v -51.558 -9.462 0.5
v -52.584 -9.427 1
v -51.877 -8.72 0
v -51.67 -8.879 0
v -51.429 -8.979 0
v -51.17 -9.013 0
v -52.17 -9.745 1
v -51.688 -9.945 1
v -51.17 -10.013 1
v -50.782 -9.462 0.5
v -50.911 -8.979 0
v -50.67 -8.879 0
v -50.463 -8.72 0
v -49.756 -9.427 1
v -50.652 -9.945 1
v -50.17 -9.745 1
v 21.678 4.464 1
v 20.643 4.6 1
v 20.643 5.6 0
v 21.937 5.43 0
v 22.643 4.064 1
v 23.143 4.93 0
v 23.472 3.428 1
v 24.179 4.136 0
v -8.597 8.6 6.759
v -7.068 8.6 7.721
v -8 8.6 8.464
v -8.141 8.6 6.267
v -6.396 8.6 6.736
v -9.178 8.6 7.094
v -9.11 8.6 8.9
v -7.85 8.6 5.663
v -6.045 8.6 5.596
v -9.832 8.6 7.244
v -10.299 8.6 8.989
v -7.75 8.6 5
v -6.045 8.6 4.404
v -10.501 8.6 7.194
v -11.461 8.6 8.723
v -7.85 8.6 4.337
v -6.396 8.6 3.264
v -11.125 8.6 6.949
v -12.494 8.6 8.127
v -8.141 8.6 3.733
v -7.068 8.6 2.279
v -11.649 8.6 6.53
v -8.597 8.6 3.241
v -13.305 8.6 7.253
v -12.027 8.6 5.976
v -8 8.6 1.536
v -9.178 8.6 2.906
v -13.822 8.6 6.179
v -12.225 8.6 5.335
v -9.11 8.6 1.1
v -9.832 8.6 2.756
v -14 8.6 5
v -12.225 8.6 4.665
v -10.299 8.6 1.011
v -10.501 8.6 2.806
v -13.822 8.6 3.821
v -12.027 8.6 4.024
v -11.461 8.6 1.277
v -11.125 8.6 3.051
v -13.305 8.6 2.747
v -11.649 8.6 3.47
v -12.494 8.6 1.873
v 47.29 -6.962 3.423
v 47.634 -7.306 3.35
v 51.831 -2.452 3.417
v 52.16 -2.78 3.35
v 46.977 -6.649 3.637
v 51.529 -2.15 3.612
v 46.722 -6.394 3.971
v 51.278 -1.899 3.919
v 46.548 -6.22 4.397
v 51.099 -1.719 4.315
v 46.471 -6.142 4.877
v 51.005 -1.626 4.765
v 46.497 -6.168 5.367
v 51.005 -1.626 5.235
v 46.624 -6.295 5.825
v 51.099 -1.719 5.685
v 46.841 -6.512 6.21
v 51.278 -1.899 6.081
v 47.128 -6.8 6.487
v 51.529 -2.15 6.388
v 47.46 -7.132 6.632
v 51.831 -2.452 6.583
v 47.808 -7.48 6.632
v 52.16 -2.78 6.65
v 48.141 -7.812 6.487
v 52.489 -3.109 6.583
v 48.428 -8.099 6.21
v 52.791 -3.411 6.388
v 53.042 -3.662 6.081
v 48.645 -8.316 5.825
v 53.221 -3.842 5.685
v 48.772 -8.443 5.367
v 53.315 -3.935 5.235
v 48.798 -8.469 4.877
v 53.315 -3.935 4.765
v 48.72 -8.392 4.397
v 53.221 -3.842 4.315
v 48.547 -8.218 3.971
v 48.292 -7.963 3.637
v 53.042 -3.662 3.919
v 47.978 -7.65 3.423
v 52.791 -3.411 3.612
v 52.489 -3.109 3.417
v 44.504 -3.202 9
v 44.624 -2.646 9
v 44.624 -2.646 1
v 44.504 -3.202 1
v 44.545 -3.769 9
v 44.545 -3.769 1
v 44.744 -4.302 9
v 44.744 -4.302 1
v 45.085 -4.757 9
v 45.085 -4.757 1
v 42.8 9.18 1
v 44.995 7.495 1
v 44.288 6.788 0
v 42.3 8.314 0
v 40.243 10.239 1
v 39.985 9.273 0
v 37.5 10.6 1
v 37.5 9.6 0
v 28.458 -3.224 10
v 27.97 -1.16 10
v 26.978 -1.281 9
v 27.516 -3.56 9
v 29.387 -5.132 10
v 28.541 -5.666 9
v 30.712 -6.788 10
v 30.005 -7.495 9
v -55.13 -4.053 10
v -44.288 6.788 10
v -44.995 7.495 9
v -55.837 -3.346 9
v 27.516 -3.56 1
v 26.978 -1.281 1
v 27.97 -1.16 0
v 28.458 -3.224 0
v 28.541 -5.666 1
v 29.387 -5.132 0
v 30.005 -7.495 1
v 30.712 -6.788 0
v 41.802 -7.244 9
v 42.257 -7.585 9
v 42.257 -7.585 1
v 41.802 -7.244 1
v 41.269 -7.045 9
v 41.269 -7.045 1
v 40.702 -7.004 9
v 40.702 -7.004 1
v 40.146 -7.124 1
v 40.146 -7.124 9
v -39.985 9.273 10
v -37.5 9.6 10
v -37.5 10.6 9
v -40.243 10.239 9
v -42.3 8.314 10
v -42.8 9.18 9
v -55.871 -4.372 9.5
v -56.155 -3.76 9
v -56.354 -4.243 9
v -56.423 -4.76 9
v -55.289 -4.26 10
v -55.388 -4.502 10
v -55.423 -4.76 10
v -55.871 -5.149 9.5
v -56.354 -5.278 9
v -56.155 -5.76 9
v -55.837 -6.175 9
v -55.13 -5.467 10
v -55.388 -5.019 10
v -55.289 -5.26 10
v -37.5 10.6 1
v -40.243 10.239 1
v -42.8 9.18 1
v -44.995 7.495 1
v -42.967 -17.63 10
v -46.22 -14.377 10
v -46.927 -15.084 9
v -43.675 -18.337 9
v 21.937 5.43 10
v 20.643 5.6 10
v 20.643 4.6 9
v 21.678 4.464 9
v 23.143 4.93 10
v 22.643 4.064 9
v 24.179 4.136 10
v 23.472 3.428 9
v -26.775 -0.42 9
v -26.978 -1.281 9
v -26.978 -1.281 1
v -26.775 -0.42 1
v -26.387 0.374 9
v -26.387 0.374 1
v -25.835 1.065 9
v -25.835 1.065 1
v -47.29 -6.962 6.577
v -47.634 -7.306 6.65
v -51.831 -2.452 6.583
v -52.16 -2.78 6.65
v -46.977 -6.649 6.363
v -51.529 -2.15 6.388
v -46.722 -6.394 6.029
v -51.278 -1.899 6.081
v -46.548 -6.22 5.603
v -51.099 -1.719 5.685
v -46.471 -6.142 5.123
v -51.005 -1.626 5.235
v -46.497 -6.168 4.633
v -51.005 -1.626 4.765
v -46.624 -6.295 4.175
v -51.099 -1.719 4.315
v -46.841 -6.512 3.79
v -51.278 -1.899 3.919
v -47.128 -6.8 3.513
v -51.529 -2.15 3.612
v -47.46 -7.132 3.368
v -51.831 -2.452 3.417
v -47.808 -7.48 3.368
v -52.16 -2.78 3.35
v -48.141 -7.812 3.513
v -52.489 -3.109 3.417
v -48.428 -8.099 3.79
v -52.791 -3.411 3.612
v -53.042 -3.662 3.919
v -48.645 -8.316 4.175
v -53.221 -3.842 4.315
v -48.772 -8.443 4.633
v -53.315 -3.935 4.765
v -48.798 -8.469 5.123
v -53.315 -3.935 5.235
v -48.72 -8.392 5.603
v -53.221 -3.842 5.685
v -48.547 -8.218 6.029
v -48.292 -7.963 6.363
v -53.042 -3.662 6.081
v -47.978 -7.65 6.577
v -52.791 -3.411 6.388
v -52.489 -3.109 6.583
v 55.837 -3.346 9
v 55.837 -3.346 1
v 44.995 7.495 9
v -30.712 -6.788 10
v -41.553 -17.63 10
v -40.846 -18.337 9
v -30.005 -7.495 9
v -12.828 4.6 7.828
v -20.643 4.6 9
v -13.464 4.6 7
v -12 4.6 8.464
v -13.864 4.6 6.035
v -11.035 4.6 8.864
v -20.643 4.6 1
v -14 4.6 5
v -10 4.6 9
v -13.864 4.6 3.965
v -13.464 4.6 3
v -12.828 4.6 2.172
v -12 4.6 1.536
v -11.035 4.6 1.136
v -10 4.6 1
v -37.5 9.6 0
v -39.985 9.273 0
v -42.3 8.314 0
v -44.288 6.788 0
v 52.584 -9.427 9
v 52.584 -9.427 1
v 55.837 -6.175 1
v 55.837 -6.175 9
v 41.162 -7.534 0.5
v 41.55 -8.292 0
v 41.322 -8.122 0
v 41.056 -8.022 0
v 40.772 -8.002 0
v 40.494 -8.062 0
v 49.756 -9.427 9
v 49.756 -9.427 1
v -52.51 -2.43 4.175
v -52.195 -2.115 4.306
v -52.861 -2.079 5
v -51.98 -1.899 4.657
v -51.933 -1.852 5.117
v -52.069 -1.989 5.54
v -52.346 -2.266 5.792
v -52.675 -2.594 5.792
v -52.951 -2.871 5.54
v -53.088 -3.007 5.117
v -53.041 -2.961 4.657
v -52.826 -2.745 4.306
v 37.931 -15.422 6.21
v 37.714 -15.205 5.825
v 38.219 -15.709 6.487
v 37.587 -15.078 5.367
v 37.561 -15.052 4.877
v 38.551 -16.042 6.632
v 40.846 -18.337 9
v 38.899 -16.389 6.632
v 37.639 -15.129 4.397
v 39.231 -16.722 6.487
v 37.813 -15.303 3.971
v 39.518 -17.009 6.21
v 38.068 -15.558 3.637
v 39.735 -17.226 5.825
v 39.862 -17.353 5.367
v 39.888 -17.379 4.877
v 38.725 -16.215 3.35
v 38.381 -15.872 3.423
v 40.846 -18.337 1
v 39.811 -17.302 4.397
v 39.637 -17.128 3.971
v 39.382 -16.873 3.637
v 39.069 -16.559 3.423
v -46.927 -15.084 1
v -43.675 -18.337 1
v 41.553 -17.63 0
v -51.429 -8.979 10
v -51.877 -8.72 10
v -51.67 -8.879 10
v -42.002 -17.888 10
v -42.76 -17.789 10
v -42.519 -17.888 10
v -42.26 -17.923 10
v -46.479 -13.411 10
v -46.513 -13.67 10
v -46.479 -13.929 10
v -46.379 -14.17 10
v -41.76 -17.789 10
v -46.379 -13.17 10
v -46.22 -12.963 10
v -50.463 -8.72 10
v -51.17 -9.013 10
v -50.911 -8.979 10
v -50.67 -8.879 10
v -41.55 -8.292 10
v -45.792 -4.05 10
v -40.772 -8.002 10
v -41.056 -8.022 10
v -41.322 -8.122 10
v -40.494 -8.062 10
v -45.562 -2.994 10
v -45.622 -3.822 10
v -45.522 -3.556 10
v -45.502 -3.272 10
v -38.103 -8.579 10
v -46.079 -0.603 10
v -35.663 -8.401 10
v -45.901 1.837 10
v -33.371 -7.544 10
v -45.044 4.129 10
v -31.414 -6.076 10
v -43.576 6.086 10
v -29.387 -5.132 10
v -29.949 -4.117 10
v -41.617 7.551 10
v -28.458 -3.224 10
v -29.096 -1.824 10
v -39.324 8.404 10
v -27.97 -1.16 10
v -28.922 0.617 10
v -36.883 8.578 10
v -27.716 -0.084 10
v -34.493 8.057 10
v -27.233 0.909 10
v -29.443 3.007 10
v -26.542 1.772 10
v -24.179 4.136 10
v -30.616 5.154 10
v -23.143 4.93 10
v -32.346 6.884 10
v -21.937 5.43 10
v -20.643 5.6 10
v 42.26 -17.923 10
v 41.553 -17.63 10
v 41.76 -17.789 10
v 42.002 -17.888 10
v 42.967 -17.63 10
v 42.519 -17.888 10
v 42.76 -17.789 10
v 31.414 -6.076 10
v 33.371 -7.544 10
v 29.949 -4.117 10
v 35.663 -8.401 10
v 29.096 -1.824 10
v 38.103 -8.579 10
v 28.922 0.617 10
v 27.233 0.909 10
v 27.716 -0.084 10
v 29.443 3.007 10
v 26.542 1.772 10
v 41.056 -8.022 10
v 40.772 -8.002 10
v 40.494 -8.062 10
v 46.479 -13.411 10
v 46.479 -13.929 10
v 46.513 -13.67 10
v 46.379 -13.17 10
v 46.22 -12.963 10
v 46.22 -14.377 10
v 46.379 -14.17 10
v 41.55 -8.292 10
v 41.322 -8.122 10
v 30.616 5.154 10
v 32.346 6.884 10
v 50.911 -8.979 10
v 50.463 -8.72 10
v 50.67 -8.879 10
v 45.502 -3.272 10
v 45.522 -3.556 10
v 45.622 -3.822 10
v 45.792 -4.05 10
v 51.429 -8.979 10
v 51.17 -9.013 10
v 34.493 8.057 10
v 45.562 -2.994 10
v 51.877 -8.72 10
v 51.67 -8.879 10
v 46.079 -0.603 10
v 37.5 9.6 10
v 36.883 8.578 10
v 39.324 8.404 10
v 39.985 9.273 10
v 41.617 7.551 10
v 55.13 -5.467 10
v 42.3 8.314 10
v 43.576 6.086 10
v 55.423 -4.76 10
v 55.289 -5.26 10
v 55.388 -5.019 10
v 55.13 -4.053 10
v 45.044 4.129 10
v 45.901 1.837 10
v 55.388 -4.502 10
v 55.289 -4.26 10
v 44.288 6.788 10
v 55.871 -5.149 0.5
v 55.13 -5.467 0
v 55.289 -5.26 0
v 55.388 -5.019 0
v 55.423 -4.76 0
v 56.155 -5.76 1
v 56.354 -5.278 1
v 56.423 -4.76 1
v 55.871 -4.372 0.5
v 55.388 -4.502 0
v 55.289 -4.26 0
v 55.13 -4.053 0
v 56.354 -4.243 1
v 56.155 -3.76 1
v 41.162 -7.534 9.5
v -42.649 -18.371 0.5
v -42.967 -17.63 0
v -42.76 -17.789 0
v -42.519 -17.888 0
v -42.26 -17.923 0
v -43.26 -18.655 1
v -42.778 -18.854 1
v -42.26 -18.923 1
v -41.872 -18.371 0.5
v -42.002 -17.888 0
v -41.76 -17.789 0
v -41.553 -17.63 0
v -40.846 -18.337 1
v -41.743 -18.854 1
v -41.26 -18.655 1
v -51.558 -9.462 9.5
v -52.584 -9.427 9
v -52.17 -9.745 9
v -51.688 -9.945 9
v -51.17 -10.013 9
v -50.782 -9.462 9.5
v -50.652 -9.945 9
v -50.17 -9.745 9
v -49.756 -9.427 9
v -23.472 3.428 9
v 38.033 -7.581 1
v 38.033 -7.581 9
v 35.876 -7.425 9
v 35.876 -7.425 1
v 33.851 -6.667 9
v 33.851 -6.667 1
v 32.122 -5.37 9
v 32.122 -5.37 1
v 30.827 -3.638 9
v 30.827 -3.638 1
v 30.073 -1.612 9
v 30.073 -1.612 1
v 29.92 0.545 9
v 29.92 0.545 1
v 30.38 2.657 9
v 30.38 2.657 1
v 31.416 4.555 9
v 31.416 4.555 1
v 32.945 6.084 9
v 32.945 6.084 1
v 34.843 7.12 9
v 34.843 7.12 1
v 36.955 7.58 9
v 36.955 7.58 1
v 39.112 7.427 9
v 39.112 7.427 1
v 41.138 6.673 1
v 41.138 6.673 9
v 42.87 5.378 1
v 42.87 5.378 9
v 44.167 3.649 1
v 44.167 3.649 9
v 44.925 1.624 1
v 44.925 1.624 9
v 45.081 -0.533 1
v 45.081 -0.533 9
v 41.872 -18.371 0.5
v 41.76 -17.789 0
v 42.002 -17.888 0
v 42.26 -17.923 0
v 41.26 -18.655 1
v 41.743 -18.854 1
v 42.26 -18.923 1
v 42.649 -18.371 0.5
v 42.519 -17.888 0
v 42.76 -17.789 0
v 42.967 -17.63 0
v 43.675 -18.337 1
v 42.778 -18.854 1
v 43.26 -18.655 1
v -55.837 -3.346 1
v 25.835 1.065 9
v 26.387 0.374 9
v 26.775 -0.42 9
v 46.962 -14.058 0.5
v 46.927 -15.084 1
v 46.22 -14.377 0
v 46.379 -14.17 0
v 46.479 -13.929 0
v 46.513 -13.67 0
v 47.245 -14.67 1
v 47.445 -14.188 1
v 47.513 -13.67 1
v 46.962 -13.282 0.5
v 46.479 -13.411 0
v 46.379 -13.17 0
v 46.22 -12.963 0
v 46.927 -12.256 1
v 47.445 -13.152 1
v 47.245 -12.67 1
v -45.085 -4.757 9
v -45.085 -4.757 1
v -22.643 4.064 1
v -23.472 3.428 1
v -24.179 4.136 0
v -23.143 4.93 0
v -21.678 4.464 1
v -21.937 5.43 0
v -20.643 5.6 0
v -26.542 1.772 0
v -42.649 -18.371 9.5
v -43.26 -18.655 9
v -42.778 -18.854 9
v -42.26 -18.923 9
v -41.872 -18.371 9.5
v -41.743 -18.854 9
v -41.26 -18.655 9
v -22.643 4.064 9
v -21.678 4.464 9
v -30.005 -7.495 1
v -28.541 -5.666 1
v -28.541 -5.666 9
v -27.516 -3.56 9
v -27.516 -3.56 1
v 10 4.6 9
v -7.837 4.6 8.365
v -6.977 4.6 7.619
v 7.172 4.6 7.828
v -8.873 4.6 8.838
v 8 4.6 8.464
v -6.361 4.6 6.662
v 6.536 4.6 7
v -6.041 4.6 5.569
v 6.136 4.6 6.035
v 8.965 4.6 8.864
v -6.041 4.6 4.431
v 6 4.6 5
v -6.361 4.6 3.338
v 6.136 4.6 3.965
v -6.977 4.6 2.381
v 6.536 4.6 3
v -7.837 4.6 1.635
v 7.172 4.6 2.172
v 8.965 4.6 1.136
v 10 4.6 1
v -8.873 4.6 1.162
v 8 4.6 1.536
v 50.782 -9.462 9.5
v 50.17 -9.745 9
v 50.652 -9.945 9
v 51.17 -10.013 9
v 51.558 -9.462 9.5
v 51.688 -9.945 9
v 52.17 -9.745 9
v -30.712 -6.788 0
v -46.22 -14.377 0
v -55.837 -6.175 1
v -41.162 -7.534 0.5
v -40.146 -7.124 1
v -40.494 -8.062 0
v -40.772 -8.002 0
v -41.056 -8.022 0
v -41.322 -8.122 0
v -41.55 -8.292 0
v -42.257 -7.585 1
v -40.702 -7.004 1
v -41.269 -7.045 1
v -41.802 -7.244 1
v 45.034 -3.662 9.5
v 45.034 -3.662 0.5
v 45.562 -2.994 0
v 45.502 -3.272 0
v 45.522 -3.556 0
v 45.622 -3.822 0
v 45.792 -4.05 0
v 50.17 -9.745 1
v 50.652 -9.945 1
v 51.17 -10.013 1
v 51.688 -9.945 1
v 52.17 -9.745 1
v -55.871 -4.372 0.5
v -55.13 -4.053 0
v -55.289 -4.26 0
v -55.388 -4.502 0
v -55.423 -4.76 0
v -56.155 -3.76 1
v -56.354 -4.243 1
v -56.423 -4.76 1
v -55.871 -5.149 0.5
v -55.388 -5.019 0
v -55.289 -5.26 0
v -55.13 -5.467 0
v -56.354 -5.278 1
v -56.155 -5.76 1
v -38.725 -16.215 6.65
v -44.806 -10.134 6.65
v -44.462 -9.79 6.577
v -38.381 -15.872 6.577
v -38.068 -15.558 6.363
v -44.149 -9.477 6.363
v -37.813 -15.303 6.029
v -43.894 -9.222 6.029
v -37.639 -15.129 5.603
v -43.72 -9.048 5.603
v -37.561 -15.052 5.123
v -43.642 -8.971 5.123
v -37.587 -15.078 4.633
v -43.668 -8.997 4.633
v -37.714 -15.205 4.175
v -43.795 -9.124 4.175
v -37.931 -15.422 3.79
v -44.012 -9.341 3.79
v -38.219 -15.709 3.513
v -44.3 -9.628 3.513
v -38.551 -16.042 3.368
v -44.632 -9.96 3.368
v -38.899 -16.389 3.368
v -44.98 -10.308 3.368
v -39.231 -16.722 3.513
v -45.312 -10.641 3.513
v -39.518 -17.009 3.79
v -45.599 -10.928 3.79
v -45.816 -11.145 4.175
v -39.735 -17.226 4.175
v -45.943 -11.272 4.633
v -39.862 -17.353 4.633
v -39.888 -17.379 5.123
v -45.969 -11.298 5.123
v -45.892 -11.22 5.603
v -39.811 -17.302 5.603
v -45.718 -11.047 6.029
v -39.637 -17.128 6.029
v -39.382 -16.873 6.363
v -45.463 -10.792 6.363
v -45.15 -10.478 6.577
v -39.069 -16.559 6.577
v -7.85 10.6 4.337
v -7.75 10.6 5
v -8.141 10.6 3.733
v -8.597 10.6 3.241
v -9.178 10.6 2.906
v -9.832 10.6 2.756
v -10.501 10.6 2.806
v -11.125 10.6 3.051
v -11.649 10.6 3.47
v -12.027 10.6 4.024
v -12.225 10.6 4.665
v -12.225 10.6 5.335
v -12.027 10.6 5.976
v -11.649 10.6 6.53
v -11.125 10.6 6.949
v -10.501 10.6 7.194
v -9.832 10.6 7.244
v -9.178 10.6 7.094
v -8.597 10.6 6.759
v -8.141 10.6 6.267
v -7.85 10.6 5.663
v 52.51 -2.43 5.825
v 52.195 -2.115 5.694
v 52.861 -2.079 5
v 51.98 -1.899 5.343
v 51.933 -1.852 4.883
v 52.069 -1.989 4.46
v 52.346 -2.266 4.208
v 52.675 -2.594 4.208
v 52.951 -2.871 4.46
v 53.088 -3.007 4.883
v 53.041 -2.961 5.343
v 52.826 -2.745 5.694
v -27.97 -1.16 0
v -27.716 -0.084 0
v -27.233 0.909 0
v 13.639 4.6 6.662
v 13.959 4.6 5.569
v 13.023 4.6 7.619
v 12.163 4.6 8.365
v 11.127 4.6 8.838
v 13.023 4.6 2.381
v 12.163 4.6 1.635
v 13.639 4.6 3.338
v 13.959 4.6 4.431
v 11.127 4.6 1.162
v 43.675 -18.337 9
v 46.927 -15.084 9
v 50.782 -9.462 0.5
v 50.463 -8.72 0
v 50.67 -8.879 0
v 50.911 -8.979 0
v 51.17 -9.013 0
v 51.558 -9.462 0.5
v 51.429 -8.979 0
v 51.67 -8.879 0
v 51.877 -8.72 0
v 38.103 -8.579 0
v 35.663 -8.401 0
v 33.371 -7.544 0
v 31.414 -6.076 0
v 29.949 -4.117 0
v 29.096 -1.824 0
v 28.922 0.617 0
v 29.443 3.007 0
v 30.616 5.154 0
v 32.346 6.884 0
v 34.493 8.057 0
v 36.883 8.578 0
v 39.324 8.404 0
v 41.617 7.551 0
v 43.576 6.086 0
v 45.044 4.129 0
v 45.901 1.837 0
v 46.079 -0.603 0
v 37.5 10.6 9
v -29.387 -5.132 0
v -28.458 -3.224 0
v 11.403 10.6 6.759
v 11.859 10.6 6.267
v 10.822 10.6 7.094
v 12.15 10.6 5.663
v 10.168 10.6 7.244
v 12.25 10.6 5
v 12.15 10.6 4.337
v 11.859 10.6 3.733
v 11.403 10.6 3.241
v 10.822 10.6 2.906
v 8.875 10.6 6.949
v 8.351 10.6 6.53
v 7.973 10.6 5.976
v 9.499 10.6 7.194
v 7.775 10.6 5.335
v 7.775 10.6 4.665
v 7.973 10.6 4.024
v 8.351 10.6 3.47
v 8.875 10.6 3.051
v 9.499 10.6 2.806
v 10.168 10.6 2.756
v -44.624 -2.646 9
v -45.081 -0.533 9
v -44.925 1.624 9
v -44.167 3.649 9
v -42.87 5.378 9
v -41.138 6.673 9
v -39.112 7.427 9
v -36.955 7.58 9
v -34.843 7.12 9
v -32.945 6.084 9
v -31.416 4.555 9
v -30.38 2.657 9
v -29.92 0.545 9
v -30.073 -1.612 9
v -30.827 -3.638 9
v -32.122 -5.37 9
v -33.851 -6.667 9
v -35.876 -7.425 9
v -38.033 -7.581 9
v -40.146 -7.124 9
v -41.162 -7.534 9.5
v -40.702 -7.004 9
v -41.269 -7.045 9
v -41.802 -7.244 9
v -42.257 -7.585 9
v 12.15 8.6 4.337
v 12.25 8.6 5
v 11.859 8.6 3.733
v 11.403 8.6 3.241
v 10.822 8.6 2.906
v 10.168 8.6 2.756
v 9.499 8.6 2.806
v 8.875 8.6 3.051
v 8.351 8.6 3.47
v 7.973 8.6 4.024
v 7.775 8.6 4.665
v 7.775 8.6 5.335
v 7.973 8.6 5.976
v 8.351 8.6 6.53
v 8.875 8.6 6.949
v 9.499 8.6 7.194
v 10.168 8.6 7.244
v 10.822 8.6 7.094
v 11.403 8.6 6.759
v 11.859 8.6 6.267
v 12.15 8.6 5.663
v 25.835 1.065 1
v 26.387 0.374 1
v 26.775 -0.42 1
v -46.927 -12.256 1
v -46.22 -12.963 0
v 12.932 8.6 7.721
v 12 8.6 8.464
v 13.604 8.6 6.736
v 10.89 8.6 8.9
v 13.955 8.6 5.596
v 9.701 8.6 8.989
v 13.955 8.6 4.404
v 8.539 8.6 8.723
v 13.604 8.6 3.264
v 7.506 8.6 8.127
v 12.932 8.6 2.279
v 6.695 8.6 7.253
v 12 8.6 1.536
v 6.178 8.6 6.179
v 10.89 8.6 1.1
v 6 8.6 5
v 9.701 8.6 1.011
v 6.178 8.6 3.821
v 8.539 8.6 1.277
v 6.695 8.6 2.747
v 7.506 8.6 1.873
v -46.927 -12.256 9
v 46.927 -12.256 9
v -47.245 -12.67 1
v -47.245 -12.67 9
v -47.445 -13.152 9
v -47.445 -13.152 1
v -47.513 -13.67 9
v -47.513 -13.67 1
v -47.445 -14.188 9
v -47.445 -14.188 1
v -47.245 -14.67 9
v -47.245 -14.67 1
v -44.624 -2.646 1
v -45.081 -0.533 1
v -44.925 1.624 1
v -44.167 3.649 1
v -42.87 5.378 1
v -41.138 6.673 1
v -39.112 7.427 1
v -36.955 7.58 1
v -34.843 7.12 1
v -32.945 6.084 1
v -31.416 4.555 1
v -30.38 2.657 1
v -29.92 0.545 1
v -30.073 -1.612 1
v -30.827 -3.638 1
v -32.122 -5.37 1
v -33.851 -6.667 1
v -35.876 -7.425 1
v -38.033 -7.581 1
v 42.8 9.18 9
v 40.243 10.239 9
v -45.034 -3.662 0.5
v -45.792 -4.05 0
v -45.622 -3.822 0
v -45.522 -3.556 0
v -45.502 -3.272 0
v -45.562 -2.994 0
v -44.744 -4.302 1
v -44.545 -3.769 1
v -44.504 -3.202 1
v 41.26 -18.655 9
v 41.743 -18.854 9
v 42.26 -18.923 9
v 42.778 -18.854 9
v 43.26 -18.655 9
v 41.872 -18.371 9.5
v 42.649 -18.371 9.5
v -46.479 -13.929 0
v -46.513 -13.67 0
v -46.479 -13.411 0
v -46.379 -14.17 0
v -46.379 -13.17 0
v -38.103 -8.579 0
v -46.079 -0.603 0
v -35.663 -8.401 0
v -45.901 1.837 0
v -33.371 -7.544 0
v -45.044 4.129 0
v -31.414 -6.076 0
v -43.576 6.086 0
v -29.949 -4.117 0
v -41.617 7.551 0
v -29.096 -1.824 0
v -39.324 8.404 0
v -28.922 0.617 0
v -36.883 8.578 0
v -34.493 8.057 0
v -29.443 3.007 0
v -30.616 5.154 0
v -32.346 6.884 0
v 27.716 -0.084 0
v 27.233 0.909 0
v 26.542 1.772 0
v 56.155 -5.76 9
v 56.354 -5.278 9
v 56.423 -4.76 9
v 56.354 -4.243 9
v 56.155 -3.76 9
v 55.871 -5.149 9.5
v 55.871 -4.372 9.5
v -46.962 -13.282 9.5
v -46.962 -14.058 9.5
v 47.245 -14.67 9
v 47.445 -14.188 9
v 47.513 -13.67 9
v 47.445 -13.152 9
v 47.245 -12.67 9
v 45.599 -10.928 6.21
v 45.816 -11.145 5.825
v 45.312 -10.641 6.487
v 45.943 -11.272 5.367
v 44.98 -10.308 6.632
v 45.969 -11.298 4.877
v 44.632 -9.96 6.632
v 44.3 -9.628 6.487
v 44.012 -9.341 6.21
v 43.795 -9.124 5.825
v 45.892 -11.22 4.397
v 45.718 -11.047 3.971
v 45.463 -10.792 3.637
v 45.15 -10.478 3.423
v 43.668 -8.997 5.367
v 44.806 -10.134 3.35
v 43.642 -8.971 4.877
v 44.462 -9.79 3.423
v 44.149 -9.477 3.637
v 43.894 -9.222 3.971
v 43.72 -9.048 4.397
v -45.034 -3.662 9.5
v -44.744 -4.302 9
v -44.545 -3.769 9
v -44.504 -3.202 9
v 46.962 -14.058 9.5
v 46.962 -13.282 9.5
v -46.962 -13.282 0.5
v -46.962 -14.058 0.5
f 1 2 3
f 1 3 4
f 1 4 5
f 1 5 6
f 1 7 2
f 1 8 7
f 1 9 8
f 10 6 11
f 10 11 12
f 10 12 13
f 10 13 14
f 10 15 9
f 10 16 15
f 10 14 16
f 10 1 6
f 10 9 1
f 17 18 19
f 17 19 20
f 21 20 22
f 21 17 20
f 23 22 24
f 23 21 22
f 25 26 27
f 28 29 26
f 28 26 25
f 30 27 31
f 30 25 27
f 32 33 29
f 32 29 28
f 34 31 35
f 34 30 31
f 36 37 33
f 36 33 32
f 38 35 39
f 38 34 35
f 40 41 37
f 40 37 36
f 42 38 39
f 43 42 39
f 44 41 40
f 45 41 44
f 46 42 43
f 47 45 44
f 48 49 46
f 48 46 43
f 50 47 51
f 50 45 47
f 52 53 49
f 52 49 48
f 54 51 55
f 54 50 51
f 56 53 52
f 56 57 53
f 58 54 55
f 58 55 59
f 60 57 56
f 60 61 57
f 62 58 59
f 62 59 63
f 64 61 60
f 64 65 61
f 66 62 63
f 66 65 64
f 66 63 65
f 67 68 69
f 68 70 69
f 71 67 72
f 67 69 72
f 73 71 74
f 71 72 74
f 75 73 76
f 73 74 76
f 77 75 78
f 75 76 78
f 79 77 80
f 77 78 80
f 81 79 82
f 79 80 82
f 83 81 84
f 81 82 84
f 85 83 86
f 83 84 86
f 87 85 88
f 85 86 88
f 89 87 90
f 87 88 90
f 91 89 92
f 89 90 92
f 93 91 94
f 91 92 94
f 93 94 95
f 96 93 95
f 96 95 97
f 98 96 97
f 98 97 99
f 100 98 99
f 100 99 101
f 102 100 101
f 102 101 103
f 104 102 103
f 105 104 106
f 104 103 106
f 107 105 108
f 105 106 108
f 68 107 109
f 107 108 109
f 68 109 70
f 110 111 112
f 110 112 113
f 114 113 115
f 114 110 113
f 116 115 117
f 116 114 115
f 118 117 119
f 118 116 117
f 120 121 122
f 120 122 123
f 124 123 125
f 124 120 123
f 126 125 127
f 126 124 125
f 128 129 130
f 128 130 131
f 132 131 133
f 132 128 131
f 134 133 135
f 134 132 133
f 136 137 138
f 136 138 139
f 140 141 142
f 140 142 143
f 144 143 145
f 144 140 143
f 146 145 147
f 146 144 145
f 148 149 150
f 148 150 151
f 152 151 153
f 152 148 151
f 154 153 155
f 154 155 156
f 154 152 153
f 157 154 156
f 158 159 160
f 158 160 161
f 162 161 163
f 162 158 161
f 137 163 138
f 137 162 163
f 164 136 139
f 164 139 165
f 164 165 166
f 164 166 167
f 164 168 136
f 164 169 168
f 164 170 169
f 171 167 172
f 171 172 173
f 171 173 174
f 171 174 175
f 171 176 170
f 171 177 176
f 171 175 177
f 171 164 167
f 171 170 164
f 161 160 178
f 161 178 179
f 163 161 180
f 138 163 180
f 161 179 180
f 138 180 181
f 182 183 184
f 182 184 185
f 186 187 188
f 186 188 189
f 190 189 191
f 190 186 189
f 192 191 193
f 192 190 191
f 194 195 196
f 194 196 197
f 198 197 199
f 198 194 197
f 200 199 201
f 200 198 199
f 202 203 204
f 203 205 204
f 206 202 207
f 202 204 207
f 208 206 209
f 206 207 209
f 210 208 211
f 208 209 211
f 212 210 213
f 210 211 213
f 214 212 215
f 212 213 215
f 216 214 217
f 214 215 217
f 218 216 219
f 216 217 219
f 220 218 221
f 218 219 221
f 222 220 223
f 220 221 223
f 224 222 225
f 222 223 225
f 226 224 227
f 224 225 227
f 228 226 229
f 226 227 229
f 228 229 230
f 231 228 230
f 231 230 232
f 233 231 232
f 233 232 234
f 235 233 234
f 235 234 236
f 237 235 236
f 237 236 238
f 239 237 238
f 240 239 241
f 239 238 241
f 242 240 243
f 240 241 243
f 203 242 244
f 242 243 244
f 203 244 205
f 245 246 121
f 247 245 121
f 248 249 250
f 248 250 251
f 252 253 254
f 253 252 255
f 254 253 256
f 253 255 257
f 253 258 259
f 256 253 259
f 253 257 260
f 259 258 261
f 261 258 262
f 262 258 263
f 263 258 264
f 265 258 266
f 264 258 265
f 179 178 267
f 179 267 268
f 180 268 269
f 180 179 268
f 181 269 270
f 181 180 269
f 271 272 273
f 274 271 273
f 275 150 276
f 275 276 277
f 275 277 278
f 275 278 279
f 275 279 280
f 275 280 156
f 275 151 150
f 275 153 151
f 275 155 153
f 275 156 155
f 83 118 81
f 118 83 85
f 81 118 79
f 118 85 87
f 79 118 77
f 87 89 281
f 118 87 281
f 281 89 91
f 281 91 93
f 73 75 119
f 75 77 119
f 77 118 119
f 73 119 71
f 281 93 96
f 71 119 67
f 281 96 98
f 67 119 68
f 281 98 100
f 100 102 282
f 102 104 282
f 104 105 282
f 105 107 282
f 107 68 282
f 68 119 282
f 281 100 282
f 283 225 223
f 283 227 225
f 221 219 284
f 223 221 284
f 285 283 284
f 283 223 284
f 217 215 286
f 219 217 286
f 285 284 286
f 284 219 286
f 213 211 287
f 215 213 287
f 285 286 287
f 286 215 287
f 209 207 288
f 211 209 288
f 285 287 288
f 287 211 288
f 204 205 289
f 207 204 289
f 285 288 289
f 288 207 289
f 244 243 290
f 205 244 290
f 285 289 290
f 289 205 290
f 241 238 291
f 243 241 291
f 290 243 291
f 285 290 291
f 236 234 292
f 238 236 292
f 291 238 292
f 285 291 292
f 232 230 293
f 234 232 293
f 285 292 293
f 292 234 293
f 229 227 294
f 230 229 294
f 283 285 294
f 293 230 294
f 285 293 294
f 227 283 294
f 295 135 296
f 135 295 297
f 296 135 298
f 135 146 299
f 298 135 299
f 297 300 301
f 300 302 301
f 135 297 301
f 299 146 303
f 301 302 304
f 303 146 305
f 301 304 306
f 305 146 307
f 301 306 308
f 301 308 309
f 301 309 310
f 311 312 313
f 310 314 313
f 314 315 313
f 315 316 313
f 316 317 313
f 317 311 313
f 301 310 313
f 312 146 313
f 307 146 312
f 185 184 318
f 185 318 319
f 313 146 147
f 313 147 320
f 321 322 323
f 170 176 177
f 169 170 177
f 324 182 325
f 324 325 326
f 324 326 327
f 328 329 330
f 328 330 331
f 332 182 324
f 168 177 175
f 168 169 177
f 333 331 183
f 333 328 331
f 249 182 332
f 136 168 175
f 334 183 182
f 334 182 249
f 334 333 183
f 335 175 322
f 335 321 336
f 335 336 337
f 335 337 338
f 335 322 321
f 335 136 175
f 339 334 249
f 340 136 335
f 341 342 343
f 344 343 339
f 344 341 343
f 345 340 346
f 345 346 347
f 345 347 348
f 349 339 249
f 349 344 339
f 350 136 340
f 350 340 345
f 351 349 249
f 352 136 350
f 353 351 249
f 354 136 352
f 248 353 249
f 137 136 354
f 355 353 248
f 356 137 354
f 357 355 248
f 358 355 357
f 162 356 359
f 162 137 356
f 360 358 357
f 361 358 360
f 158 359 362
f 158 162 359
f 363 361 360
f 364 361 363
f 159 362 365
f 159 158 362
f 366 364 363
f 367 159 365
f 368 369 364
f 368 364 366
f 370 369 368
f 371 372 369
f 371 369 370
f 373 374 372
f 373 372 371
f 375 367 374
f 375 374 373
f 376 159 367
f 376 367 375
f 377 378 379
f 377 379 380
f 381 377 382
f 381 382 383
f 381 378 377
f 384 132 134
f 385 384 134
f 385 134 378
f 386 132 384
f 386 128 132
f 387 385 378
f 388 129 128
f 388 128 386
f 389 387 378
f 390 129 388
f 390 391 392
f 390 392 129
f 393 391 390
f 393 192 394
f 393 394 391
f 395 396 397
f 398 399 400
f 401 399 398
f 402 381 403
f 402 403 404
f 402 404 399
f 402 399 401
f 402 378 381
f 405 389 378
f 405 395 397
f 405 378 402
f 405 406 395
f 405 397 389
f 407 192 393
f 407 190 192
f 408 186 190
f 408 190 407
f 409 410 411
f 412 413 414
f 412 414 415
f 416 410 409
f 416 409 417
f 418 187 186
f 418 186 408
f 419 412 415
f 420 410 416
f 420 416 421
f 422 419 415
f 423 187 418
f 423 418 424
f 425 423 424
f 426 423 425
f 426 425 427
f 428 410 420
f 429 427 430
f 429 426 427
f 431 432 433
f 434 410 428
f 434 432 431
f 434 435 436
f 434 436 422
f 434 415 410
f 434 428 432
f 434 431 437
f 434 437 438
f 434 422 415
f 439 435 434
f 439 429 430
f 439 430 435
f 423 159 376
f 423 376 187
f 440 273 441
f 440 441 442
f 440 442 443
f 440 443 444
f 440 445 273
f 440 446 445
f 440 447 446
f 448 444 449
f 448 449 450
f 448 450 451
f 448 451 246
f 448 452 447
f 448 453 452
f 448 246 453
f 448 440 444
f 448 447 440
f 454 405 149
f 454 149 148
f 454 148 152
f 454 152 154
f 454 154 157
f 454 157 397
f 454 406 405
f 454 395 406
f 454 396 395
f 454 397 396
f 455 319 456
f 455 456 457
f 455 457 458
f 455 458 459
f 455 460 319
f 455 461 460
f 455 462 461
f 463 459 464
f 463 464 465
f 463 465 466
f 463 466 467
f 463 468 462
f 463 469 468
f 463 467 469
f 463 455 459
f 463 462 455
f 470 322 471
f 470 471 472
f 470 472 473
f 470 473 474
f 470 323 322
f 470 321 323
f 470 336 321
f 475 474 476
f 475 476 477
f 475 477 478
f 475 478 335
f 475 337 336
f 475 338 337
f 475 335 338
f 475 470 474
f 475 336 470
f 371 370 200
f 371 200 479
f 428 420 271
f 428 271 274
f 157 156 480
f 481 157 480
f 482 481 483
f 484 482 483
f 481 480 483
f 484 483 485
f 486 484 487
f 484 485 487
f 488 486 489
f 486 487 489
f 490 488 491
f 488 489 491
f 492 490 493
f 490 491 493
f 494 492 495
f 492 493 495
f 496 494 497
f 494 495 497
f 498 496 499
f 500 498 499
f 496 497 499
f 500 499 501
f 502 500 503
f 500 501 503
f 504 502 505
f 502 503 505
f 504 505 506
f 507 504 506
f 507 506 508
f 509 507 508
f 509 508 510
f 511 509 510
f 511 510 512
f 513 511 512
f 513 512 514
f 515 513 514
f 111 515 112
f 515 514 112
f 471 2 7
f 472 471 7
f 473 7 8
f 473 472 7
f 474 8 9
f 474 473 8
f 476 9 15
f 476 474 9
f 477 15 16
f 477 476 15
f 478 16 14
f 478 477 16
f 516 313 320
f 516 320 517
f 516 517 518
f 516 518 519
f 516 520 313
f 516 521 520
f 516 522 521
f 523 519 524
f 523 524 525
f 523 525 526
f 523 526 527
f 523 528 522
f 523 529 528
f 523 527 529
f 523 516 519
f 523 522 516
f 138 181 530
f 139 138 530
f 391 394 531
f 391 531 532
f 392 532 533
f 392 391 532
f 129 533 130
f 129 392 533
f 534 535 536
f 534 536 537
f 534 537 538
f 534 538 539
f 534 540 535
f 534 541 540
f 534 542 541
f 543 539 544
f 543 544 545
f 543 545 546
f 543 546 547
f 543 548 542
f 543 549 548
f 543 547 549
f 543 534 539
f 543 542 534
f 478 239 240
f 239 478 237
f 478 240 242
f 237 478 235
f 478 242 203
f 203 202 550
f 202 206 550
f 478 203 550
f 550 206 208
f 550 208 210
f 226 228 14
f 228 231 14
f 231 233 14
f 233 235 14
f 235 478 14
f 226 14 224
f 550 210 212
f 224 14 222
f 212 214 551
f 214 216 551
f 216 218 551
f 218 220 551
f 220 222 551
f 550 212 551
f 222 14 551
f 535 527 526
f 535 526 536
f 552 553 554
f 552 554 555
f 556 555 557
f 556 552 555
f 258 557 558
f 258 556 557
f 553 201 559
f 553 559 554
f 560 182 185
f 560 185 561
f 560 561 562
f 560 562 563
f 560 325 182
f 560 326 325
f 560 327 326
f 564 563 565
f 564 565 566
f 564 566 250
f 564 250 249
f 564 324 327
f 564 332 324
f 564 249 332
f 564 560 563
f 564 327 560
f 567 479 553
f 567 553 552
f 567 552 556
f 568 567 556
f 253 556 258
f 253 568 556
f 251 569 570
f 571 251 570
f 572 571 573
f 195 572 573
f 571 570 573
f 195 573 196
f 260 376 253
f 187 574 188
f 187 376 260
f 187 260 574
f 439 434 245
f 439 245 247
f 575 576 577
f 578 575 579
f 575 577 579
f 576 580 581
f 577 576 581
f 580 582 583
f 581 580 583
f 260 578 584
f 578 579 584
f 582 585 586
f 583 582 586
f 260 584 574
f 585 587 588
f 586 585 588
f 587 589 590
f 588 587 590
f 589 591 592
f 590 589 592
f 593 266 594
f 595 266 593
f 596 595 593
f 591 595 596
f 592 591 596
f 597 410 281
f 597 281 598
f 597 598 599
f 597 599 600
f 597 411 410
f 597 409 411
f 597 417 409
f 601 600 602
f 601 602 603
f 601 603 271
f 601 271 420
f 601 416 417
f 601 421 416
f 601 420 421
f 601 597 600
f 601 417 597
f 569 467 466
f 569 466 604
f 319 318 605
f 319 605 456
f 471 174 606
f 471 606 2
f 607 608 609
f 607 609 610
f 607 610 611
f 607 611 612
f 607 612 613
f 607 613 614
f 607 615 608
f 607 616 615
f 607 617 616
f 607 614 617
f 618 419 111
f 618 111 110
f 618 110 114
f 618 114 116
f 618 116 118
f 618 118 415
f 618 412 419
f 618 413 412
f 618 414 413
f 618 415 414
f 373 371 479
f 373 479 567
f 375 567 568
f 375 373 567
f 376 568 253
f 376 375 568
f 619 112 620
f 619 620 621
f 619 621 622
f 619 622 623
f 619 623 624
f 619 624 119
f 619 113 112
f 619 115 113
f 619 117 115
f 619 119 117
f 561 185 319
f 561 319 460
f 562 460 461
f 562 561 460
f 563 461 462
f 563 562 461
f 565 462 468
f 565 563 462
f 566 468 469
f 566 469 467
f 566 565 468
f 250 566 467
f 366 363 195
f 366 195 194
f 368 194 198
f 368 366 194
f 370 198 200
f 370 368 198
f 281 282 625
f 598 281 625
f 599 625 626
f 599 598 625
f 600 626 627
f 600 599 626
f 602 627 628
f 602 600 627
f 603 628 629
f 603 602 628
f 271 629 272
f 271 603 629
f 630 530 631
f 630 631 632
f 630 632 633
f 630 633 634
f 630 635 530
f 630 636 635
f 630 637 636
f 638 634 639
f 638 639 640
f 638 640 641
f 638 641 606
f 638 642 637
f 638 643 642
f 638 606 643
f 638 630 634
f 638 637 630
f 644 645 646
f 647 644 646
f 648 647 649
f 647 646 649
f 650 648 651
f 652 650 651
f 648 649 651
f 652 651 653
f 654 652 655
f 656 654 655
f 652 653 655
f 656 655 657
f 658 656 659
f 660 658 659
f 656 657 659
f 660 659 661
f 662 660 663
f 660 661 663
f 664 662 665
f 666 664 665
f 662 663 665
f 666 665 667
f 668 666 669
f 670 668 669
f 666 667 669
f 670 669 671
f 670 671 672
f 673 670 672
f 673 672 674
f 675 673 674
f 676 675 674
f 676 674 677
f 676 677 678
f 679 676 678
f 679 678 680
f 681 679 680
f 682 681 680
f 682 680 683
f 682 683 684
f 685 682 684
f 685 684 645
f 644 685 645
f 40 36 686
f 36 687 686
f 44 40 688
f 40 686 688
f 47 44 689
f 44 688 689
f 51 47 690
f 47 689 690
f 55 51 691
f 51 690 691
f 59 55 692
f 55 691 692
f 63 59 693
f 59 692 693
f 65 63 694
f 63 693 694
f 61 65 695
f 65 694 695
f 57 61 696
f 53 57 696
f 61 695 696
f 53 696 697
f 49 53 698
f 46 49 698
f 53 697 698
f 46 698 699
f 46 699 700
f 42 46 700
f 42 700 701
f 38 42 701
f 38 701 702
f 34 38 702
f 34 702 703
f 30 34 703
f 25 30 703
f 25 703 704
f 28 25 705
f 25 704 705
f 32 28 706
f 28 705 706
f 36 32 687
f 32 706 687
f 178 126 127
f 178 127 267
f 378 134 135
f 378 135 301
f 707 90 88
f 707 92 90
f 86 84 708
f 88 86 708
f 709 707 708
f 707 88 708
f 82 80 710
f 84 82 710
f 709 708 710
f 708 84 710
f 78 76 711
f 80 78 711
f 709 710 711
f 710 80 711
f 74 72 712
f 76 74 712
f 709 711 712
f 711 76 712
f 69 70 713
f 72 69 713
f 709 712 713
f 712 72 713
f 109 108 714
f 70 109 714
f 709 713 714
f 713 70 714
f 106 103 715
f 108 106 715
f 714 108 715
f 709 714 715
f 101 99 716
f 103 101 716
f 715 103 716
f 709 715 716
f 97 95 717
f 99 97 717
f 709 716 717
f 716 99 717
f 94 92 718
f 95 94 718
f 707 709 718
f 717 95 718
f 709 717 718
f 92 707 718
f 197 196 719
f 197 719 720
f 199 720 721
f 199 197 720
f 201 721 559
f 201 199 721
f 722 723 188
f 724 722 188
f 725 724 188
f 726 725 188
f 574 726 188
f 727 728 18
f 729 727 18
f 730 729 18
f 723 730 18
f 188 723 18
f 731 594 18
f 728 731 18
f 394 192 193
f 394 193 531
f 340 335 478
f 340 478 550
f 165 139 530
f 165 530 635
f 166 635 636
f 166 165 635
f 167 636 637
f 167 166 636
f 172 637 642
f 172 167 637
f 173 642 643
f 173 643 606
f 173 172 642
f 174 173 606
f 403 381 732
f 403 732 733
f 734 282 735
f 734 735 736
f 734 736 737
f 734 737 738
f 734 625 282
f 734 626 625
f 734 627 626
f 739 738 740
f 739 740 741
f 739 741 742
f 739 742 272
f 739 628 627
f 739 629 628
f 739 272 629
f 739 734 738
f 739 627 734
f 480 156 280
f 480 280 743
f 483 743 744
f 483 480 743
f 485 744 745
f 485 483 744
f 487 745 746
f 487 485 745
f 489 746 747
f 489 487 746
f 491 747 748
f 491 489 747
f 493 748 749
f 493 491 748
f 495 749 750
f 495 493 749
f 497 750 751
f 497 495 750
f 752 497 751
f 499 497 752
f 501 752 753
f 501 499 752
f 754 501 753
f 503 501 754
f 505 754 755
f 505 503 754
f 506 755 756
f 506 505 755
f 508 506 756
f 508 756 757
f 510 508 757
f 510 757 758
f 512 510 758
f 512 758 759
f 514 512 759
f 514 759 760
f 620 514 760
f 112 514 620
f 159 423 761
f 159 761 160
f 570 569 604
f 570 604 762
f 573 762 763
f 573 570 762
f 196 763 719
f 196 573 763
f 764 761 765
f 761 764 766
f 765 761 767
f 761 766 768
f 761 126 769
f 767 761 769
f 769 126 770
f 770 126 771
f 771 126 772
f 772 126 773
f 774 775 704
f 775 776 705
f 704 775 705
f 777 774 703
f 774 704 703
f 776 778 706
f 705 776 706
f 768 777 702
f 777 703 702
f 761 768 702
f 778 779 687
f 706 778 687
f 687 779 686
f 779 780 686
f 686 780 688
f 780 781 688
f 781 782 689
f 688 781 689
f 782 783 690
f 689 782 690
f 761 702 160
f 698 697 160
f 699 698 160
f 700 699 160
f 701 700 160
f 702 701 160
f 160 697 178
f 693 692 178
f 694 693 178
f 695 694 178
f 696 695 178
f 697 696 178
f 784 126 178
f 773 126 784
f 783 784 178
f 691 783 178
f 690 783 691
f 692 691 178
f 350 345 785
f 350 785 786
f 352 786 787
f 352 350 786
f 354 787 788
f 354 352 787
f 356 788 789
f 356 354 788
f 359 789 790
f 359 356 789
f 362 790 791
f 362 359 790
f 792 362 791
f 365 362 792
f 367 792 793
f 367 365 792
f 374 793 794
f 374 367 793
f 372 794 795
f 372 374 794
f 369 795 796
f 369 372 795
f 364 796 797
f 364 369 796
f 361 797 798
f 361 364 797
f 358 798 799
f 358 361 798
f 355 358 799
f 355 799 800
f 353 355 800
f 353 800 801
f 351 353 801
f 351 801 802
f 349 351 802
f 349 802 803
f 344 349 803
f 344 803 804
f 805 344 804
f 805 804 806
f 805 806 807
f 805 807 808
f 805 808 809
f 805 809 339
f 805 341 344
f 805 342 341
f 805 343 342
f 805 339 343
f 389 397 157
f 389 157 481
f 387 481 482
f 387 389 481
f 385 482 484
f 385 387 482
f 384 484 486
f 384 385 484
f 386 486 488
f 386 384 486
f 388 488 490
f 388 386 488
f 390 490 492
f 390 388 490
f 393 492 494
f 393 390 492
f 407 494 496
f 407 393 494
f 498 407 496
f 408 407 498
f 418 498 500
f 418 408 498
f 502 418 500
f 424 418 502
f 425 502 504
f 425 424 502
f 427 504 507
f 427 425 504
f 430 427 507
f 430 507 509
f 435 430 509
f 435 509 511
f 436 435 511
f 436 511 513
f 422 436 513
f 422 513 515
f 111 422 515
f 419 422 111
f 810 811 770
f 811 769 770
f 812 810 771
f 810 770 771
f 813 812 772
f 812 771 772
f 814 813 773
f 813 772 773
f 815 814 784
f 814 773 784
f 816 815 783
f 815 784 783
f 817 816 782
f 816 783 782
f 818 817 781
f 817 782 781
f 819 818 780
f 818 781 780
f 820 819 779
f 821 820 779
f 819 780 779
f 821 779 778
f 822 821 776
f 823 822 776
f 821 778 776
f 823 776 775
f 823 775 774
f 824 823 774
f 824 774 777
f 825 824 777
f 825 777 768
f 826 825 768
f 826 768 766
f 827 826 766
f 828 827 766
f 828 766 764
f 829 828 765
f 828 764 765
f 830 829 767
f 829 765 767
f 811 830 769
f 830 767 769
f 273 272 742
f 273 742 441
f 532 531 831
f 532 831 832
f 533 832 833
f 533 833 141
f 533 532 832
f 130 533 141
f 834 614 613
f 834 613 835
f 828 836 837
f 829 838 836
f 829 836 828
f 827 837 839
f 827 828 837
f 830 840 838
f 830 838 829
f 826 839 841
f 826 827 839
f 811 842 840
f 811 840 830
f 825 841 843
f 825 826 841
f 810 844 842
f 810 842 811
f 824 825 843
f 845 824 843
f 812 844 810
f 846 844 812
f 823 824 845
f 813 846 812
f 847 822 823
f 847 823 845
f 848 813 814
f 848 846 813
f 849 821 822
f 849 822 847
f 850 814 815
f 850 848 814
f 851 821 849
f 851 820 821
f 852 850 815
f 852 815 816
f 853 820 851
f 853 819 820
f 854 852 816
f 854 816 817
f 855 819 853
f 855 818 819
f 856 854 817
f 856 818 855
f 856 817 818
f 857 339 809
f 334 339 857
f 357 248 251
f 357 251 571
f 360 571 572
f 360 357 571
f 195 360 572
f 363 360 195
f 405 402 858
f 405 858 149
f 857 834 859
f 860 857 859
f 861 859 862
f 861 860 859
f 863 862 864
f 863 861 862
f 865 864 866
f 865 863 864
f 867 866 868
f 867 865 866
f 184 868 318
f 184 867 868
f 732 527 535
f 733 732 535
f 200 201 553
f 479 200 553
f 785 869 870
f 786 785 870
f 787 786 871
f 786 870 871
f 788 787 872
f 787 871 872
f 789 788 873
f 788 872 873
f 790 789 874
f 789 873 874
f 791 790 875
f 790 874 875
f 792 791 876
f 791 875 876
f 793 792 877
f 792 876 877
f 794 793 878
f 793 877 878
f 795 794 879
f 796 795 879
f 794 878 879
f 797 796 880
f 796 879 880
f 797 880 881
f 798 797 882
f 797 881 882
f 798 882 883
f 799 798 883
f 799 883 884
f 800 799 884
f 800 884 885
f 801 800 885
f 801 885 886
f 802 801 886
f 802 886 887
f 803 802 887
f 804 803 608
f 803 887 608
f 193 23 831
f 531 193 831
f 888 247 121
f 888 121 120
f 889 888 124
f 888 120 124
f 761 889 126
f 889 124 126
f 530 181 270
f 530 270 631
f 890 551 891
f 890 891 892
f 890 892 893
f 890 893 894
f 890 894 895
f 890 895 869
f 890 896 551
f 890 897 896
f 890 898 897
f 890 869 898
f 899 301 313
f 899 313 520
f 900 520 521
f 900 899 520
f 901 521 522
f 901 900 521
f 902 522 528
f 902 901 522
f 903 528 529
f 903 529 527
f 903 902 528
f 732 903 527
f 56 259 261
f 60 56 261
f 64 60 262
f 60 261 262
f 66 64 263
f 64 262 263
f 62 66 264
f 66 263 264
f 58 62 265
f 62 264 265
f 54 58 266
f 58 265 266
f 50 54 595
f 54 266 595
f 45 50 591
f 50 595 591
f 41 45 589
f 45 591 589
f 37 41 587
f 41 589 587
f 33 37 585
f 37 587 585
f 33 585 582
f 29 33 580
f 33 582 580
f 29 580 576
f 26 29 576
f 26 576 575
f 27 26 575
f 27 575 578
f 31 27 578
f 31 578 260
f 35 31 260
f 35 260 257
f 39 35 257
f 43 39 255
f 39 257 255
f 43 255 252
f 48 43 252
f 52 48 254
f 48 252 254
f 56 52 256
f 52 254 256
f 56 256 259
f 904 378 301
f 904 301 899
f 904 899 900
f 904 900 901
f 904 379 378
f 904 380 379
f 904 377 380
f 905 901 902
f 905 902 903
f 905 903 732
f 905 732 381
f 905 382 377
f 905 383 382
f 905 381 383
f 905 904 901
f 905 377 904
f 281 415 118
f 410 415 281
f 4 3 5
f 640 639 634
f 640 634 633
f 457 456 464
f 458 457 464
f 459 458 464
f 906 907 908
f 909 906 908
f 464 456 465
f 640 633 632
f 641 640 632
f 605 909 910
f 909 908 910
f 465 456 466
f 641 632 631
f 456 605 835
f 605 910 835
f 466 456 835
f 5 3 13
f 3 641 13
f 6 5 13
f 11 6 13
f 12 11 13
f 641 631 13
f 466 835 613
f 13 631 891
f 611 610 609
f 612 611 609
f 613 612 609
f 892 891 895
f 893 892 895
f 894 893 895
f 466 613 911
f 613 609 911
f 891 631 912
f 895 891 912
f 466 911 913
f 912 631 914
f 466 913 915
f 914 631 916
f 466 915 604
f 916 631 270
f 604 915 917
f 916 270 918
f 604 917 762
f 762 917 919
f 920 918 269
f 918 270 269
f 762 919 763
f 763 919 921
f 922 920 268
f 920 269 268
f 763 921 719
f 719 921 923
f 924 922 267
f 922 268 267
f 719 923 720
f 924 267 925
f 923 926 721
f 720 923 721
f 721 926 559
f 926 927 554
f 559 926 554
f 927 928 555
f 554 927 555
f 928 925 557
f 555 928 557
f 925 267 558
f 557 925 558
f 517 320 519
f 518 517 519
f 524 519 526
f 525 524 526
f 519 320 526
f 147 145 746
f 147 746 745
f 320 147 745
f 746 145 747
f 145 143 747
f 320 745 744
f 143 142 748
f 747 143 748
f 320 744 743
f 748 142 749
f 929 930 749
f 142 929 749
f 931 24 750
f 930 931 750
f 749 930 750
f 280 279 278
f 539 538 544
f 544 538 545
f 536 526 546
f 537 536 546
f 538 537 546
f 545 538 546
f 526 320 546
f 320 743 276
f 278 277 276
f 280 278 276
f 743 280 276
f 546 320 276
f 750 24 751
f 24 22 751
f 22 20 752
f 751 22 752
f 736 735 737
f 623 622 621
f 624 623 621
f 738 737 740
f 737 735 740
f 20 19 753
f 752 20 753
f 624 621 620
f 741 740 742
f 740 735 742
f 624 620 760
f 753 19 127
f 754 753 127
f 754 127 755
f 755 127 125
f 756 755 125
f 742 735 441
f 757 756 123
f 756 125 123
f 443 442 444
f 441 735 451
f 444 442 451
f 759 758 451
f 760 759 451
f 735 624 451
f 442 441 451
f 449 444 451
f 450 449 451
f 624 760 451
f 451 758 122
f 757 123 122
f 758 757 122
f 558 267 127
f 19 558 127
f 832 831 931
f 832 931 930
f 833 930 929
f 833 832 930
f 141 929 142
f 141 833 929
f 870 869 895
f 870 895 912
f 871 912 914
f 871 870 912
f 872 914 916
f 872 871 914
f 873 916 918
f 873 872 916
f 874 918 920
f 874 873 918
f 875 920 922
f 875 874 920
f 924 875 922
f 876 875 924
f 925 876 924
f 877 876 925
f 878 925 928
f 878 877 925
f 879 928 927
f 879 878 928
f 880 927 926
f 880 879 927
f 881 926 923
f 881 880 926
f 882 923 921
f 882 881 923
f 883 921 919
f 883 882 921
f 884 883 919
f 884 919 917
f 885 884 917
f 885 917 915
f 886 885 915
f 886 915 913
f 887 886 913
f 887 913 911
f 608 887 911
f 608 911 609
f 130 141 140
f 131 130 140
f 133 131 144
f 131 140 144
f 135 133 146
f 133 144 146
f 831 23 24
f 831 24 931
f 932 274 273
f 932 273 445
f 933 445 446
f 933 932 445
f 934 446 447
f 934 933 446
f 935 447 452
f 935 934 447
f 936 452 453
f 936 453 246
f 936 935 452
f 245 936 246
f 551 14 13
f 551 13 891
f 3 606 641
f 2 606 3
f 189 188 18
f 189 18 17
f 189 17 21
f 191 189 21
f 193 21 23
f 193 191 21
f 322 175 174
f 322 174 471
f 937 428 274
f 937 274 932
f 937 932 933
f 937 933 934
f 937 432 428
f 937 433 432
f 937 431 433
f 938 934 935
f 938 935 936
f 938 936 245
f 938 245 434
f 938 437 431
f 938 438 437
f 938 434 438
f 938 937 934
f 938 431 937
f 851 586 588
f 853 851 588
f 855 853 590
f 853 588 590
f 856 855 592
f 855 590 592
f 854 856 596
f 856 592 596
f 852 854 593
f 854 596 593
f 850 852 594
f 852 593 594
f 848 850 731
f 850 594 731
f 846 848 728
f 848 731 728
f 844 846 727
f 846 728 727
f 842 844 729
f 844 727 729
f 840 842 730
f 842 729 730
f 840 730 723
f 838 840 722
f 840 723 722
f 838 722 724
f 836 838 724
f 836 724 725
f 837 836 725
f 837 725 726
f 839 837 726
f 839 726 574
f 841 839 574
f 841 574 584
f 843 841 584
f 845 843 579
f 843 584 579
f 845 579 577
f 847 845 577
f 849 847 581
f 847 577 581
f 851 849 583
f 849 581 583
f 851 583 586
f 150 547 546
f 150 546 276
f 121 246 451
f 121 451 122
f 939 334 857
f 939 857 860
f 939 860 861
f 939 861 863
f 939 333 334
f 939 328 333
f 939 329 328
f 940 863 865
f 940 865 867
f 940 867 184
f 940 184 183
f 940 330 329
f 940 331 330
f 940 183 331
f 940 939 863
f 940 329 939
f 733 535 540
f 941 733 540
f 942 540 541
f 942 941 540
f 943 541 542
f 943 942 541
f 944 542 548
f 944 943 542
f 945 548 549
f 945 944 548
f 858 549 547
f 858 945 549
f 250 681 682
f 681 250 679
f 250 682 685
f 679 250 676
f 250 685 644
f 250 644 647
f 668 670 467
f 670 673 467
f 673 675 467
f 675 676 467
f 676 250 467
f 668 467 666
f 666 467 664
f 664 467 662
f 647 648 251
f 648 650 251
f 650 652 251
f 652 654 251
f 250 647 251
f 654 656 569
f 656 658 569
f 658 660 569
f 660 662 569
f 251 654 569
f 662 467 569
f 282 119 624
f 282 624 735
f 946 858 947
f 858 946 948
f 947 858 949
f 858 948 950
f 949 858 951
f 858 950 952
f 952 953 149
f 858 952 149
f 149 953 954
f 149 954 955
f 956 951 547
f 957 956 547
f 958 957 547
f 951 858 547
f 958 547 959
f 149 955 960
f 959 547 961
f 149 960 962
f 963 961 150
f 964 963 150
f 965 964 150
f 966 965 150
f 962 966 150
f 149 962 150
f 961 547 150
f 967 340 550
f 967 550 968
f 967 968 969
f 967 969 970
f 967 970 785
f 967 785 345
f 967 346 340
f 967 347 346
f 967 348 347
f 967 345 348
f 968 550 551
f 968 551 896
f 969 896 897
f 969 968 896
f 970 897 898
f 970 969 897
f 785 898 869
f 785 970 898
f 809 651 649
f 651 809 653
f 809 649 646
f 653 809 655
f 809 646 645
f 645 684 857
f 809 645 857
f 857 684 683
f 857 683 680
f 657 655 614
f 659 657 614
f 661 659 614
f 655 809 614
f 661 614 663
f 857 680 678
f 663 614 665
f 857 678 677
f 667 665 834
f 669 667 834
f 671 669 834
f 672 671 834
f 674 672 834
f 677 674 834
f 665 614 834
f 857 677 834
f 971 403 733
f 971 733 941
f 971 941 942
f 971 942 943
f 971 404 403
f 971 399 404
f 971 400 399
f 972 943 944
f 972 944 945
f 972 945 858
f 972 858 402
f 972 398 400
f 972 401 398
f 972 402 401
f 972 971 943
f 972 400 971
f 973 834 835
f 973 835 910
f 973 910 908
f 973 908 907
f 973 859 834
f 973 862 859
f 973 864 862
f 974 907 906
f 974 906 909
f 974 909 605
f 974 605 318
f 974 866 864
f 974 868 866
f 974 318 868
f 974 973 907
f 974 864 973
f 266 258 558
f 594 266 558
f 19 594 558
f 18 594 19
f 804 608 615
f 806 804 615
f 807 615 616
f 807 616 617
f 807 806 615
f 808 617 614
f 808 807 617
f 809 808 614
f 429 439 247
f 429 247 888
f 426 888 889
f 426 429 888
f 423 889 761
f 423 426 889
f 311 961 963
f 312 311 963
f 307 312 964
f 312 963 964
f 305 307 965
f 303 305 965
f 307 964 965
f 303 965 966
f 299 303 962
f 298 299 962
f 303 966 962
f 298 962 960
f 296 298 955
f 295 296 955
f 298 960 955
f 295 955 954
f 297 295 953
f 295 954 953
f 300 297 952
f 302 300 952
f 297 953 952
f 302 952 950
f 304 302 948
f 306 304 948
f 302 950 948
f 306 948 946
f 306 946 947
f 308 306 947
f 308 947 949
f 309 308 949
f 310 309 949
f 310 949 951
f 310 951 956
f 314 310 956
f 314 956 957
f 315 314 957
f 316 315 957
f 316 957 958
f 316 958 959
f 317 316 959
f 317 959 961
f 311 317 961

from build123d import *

# Parameters (mm, degrees)
EXTRUDE_1_DEPTH             = 10
M4X0_71_D                   = 3.3
M4X0_71_DEPTH               = 19
M4X0_71_TIP                 = 0.991420021
M4X0_72_D                   = 3.3
M4X0_72_DEPTH               = 19
M4X0_72_TIP                 = 0.991420021
FILLET_1_R                  = 2
FILLET_2_R                  = 4
CHAMFER_1_SIZE              = 1
HOLE_WIZARD_M41_D           = 4.5
HOLE_WIZARD_M41_CBORE_D     = 8
HOLE_WIZARD_M41_CBORE_DEPTH = 4


with BuildPart() as part:
    # Эскиз1 → Бобышка-Вытянуть1 (new body)
    with BuildSketch(Plane.XY):
        with BuildLine():
            Line((-44.995331881, 7.495331881), (-57.250992251, -4.76032849))
            Line((-57.250992251, -4.76032849), (-51.169873933, -10.841446808))
            Line((-51.169873933, -10.841446808), (-44.098806121, -3.770378996))
            ThreePointArc((-44.098806121, -3.770378996), (-32.125988463, 5.374011537), (-41.270378996, -6.598806121))
            Line((-41.270378996, -6.598806121), (-48.341446808, -13.669873933))
            Line((-48.341446808, -13.669873933), (-42.26032849, -19.750992251))
            Line((-42.26032849, -19.750992251), (-30.004668119, -7.495331881))
            ThreePointArc((-30.004668119, -7.495331881), (-27.706876955, -4.056444383), (-26.9, 0))
            Line((-26.9, 0), (-22.3, 4.6))
            Line((-22.3, 4.6), (22.3, 4.6))
            Line((22.3, 4.6), (26.9, 0))
            ThreePointArc((26.9, 0), (27.706876955, -4.056444383), (30.004668119, -7.495331881))
            Line((30.004668119, -7.495331881), (42.26032849, -19.750992251))
            Line((42.26032849, -19.750992251), (48.341446808, -13.669873933))
            Line((48.341446808, -13.669873933), (41.270378996, -6.598806121))
            ThreePointArc((41.270378996, -6.598806121), (32.125988463, 5.374011537), (44.098806121, -3.770378996))
            Line((44.098806121, -3.770378996), (51.169873933, -10.841446808))
            Line((51.169873933, -10.841446808), (57.250992251, -4.76032849))
            Line((57.250992251, -4.76032849), (44.995331881, 7.495331881))
            ThreePointArc((44.995331881, 7.495331881), (41.556444383, 9.793123045), (37.5, 10.6))
            Line((37.5, 10.6), (-37.5, 10.6))
            ThreePointArc((-37.5, 10.6), (-41.556444383, 9.793123045), (-44.995331881, 7.495331881))
        make_face()
    extrude(amount=EXTRUDE_1_DEPTH)

    # Отверстие обработанное метчиком M4x0.71
    with Locations(Plane(origin=(11.254668119, 11.254668119, 0), x_dir=(0, 0, 1), z_dir=(-0.707106781, -0.707106781, 0))):
        with Locations((5, -38.848625406)):
            Hole(M4X0_71_D / 2, depth=M4X0_71_DEPTH)
            with Locations((0, 0, -(M4X0_71_DEPTH + M4X0_71_TIP / 2))):  # 118° drill point
                Cone(0, M4X0_71_D / 2, M4X0_71_TIP, mode=Mode.SUBTRACT)

    # Отверстие обработанное метчиком M4x0.72
    with Locations(Plane(origin=(-11.254668119, 11.254668119, 0), x_dir=(0, 0, -1), z_dir=(0.707106781, -0.707106781, 0))):
        with Locations((-5, -38.848625406)):
            Hole(M4X0_72_D / 2, depth=M4X0_72_DEPTH)
            with Locations((0, 0, -(M4X0_72_DEPTH + M4X0_72_TIP / 2))):  # 118° drill point
                Cone(0, M4X0_72_D / 2, M4X0_72_TIP, mode=Mode.SUBTRACT)

    # Скругление1
    fillet_1_edges = [part.edges().sort_by_distance(p)[0] for p in [
        (-42.26032849, -19.750992251, 5),
        (-48.341446808, -13.669873933, 5),
        (-41.270378996, -6.598806121, 5),
        (-44.098806121, -3.770378996, 5),
        (-51.169873933, -10.841446808, 5),
        (-57.250992251, -4.76032849, 5),
        (57.250992251, -4.76032849, 5),
        (51.169873933, -10.841446808, 5),
        (44.098806121, -3.770378996, 5),
        (41.270378996, -6.598806121, 5),
        (48.341446808, -13.669873933, 5),
        (42.26032849, -19.750992251, 5),
    ]]
    fillet(fillet_1_edges, radius=FILLET_1_R)

    # Скругление2
    fillet_2_edges = [part.edges().sort_by_distance(p)[0] for p in [
        (26.9, 0, 5),
        (22.3, 4.6, 5),
        (-22.3, 4.6, 5),
        (-26.9, 0, 5),
    ]]
    fillet(fillet_2_edges, radius=FILLET_2_R)

    # Фаска1
    chamfer_1_edges = [part.edges().sort_by_distance(p)[0] for p in [
        (-41.268947779, -7.045325886, 10),
        (-44.545325886, -3.768947779, 10),
        (41.268947779, -7.045325886, 10),
        (44.545325886, -3.768947779, 10),
        (47.513019683, -13.669873933, 10),
        (42.26032849, -18.922565126, 10),
        (51.169873933, -10.013019683, 10),
        (56.422565126, -4.76032849, 10),
        (-24.653465253, 2.246534747, 0),
        (-24.653465253, 2.246534747, 10),
        (0, 4.6, 0),
        (0, 4.6, 10),
        (27.970298296, -4.641636073, 0),
        (27.970298296, -4.641636073, 10),
        (24.653465253, 2.246534747, 0),
        (24.653465253, 2.246534747, 10),
        (-26.603044357, -0.012223974, 0),
        (-26.603044357, -0.012223974, 10),
        (-22.17387948, 4.29551813, 0),
        (-22.17387948, 4.29551813, 10),
        (26.603044357, -0.012223974, 0),
        (26.603044357, -0.012223974, 10),
        (22.17387948, 4.29551813, 0),
        (22.17387948, 4.29551813, 10),
        (35.425391524, -12.916055285, 10),
        (-50.416055285, 2.074608476, 0),
        (-41.556444383, 9.793123045, 0),
        (0, 10.6, 0),
        (41.556444383, 9.793123045, 0),
        (35.425391524, -12.916055285, 0),
        (-27.970298296, -4.641636073, 0),
        (-27.970298296, -4.641636073, 10),
        (41.556444383, 9.793123045, 10),
        (0, 10.6, 10),
        (-41.556444383, 9.793123045, 10),
        (-50.416055285, 2.074608476, 10),
        (50.416055285, 2.074608476, 0),
        (50.416055285, 2.074608476, 10),
        (-35.425391524, -12.916055285, 0),
        (-45.300887649, -16.710433092, 0),
        (-44.591959566, -9.920386691, 0),
        (-32.125988463, 5.374011537, 0),
        (-47.420386691, -7.091959566, 0),
        (-54.210433092, -7.800887649, 0),
        (54.210433092, -7.800887649, 0),
        (47.420386691, -7.091959566, 0),
        (32.125988463, 5.374011537, 0),
        (44.591959566, -9.920386691, 0),
        (45.300887649, -16.710433092, 0),
        (-42.26032849, -18.922565126, 0),
        (-47.513019683, -13.669873933, 0),
        (-51.169873933, -10.013019683, 0),
        (-56.422565126, -4.76032849, 0),
        (-41.268947779, -7.045325886, 0),
        (-44.545325886, -3.768947779, 0),
        (41.268947779, -7.045325886, 0),
        (44.545325886, -3.768947779, 0),
        (47.513019683, -13.669873933, 0),
        (42.26032849, -18.922565126, 0),
        (51.169873933, -10.013019683, 0),
        (56.422565126, -4.76032849, 0),
        (54.210433092, -7.800887649, 10),
        (45.300887649, -16.710433092, 10),
        (44.591959566, -9.920386691, 10),
        (32.125988463, 5.374011537, 10),
        (47.420386691, -7.091959566, 10),
        (-54.210433092, -7.800887649, 10),
        (-47.420386691, -7.091959566, 10),
        (-32.125988463, 5.374011537, 10),
        (-44.591959566, -9.920386691, 10),
        (-45.300887649, -16.710433092, 10),
        (-35.425391524, -12.916055285, 10),
        (-42.26032849, -18.922565126, 10),
        (-47.513019683, -13.669873933, 10),
        (-51.169873933, -10.013019683, 10),
        (-56.422565126, -4.76032849, 10),
    ]]
    chamfer(chamfer_1_edges, length=CHAMFER_1_SIZE)

    # Цековка для винта с внутренним шестигранником M41 (through all)
    with Locations(Plane(origin=(0, 4.6, 0), x_dir=(-1, 0, 0), z_dir=(0, -1, 0))):
        with Locations((10, -5), (-10, -5)):
            CounterBoreHole(HOLE_WIZARD_M41_D / 2, HOLE_WIZARD_M41_CBORE_D / 2, HOLE_WIZARD_M41_CBORE_DEPTH)


solid = part.part
